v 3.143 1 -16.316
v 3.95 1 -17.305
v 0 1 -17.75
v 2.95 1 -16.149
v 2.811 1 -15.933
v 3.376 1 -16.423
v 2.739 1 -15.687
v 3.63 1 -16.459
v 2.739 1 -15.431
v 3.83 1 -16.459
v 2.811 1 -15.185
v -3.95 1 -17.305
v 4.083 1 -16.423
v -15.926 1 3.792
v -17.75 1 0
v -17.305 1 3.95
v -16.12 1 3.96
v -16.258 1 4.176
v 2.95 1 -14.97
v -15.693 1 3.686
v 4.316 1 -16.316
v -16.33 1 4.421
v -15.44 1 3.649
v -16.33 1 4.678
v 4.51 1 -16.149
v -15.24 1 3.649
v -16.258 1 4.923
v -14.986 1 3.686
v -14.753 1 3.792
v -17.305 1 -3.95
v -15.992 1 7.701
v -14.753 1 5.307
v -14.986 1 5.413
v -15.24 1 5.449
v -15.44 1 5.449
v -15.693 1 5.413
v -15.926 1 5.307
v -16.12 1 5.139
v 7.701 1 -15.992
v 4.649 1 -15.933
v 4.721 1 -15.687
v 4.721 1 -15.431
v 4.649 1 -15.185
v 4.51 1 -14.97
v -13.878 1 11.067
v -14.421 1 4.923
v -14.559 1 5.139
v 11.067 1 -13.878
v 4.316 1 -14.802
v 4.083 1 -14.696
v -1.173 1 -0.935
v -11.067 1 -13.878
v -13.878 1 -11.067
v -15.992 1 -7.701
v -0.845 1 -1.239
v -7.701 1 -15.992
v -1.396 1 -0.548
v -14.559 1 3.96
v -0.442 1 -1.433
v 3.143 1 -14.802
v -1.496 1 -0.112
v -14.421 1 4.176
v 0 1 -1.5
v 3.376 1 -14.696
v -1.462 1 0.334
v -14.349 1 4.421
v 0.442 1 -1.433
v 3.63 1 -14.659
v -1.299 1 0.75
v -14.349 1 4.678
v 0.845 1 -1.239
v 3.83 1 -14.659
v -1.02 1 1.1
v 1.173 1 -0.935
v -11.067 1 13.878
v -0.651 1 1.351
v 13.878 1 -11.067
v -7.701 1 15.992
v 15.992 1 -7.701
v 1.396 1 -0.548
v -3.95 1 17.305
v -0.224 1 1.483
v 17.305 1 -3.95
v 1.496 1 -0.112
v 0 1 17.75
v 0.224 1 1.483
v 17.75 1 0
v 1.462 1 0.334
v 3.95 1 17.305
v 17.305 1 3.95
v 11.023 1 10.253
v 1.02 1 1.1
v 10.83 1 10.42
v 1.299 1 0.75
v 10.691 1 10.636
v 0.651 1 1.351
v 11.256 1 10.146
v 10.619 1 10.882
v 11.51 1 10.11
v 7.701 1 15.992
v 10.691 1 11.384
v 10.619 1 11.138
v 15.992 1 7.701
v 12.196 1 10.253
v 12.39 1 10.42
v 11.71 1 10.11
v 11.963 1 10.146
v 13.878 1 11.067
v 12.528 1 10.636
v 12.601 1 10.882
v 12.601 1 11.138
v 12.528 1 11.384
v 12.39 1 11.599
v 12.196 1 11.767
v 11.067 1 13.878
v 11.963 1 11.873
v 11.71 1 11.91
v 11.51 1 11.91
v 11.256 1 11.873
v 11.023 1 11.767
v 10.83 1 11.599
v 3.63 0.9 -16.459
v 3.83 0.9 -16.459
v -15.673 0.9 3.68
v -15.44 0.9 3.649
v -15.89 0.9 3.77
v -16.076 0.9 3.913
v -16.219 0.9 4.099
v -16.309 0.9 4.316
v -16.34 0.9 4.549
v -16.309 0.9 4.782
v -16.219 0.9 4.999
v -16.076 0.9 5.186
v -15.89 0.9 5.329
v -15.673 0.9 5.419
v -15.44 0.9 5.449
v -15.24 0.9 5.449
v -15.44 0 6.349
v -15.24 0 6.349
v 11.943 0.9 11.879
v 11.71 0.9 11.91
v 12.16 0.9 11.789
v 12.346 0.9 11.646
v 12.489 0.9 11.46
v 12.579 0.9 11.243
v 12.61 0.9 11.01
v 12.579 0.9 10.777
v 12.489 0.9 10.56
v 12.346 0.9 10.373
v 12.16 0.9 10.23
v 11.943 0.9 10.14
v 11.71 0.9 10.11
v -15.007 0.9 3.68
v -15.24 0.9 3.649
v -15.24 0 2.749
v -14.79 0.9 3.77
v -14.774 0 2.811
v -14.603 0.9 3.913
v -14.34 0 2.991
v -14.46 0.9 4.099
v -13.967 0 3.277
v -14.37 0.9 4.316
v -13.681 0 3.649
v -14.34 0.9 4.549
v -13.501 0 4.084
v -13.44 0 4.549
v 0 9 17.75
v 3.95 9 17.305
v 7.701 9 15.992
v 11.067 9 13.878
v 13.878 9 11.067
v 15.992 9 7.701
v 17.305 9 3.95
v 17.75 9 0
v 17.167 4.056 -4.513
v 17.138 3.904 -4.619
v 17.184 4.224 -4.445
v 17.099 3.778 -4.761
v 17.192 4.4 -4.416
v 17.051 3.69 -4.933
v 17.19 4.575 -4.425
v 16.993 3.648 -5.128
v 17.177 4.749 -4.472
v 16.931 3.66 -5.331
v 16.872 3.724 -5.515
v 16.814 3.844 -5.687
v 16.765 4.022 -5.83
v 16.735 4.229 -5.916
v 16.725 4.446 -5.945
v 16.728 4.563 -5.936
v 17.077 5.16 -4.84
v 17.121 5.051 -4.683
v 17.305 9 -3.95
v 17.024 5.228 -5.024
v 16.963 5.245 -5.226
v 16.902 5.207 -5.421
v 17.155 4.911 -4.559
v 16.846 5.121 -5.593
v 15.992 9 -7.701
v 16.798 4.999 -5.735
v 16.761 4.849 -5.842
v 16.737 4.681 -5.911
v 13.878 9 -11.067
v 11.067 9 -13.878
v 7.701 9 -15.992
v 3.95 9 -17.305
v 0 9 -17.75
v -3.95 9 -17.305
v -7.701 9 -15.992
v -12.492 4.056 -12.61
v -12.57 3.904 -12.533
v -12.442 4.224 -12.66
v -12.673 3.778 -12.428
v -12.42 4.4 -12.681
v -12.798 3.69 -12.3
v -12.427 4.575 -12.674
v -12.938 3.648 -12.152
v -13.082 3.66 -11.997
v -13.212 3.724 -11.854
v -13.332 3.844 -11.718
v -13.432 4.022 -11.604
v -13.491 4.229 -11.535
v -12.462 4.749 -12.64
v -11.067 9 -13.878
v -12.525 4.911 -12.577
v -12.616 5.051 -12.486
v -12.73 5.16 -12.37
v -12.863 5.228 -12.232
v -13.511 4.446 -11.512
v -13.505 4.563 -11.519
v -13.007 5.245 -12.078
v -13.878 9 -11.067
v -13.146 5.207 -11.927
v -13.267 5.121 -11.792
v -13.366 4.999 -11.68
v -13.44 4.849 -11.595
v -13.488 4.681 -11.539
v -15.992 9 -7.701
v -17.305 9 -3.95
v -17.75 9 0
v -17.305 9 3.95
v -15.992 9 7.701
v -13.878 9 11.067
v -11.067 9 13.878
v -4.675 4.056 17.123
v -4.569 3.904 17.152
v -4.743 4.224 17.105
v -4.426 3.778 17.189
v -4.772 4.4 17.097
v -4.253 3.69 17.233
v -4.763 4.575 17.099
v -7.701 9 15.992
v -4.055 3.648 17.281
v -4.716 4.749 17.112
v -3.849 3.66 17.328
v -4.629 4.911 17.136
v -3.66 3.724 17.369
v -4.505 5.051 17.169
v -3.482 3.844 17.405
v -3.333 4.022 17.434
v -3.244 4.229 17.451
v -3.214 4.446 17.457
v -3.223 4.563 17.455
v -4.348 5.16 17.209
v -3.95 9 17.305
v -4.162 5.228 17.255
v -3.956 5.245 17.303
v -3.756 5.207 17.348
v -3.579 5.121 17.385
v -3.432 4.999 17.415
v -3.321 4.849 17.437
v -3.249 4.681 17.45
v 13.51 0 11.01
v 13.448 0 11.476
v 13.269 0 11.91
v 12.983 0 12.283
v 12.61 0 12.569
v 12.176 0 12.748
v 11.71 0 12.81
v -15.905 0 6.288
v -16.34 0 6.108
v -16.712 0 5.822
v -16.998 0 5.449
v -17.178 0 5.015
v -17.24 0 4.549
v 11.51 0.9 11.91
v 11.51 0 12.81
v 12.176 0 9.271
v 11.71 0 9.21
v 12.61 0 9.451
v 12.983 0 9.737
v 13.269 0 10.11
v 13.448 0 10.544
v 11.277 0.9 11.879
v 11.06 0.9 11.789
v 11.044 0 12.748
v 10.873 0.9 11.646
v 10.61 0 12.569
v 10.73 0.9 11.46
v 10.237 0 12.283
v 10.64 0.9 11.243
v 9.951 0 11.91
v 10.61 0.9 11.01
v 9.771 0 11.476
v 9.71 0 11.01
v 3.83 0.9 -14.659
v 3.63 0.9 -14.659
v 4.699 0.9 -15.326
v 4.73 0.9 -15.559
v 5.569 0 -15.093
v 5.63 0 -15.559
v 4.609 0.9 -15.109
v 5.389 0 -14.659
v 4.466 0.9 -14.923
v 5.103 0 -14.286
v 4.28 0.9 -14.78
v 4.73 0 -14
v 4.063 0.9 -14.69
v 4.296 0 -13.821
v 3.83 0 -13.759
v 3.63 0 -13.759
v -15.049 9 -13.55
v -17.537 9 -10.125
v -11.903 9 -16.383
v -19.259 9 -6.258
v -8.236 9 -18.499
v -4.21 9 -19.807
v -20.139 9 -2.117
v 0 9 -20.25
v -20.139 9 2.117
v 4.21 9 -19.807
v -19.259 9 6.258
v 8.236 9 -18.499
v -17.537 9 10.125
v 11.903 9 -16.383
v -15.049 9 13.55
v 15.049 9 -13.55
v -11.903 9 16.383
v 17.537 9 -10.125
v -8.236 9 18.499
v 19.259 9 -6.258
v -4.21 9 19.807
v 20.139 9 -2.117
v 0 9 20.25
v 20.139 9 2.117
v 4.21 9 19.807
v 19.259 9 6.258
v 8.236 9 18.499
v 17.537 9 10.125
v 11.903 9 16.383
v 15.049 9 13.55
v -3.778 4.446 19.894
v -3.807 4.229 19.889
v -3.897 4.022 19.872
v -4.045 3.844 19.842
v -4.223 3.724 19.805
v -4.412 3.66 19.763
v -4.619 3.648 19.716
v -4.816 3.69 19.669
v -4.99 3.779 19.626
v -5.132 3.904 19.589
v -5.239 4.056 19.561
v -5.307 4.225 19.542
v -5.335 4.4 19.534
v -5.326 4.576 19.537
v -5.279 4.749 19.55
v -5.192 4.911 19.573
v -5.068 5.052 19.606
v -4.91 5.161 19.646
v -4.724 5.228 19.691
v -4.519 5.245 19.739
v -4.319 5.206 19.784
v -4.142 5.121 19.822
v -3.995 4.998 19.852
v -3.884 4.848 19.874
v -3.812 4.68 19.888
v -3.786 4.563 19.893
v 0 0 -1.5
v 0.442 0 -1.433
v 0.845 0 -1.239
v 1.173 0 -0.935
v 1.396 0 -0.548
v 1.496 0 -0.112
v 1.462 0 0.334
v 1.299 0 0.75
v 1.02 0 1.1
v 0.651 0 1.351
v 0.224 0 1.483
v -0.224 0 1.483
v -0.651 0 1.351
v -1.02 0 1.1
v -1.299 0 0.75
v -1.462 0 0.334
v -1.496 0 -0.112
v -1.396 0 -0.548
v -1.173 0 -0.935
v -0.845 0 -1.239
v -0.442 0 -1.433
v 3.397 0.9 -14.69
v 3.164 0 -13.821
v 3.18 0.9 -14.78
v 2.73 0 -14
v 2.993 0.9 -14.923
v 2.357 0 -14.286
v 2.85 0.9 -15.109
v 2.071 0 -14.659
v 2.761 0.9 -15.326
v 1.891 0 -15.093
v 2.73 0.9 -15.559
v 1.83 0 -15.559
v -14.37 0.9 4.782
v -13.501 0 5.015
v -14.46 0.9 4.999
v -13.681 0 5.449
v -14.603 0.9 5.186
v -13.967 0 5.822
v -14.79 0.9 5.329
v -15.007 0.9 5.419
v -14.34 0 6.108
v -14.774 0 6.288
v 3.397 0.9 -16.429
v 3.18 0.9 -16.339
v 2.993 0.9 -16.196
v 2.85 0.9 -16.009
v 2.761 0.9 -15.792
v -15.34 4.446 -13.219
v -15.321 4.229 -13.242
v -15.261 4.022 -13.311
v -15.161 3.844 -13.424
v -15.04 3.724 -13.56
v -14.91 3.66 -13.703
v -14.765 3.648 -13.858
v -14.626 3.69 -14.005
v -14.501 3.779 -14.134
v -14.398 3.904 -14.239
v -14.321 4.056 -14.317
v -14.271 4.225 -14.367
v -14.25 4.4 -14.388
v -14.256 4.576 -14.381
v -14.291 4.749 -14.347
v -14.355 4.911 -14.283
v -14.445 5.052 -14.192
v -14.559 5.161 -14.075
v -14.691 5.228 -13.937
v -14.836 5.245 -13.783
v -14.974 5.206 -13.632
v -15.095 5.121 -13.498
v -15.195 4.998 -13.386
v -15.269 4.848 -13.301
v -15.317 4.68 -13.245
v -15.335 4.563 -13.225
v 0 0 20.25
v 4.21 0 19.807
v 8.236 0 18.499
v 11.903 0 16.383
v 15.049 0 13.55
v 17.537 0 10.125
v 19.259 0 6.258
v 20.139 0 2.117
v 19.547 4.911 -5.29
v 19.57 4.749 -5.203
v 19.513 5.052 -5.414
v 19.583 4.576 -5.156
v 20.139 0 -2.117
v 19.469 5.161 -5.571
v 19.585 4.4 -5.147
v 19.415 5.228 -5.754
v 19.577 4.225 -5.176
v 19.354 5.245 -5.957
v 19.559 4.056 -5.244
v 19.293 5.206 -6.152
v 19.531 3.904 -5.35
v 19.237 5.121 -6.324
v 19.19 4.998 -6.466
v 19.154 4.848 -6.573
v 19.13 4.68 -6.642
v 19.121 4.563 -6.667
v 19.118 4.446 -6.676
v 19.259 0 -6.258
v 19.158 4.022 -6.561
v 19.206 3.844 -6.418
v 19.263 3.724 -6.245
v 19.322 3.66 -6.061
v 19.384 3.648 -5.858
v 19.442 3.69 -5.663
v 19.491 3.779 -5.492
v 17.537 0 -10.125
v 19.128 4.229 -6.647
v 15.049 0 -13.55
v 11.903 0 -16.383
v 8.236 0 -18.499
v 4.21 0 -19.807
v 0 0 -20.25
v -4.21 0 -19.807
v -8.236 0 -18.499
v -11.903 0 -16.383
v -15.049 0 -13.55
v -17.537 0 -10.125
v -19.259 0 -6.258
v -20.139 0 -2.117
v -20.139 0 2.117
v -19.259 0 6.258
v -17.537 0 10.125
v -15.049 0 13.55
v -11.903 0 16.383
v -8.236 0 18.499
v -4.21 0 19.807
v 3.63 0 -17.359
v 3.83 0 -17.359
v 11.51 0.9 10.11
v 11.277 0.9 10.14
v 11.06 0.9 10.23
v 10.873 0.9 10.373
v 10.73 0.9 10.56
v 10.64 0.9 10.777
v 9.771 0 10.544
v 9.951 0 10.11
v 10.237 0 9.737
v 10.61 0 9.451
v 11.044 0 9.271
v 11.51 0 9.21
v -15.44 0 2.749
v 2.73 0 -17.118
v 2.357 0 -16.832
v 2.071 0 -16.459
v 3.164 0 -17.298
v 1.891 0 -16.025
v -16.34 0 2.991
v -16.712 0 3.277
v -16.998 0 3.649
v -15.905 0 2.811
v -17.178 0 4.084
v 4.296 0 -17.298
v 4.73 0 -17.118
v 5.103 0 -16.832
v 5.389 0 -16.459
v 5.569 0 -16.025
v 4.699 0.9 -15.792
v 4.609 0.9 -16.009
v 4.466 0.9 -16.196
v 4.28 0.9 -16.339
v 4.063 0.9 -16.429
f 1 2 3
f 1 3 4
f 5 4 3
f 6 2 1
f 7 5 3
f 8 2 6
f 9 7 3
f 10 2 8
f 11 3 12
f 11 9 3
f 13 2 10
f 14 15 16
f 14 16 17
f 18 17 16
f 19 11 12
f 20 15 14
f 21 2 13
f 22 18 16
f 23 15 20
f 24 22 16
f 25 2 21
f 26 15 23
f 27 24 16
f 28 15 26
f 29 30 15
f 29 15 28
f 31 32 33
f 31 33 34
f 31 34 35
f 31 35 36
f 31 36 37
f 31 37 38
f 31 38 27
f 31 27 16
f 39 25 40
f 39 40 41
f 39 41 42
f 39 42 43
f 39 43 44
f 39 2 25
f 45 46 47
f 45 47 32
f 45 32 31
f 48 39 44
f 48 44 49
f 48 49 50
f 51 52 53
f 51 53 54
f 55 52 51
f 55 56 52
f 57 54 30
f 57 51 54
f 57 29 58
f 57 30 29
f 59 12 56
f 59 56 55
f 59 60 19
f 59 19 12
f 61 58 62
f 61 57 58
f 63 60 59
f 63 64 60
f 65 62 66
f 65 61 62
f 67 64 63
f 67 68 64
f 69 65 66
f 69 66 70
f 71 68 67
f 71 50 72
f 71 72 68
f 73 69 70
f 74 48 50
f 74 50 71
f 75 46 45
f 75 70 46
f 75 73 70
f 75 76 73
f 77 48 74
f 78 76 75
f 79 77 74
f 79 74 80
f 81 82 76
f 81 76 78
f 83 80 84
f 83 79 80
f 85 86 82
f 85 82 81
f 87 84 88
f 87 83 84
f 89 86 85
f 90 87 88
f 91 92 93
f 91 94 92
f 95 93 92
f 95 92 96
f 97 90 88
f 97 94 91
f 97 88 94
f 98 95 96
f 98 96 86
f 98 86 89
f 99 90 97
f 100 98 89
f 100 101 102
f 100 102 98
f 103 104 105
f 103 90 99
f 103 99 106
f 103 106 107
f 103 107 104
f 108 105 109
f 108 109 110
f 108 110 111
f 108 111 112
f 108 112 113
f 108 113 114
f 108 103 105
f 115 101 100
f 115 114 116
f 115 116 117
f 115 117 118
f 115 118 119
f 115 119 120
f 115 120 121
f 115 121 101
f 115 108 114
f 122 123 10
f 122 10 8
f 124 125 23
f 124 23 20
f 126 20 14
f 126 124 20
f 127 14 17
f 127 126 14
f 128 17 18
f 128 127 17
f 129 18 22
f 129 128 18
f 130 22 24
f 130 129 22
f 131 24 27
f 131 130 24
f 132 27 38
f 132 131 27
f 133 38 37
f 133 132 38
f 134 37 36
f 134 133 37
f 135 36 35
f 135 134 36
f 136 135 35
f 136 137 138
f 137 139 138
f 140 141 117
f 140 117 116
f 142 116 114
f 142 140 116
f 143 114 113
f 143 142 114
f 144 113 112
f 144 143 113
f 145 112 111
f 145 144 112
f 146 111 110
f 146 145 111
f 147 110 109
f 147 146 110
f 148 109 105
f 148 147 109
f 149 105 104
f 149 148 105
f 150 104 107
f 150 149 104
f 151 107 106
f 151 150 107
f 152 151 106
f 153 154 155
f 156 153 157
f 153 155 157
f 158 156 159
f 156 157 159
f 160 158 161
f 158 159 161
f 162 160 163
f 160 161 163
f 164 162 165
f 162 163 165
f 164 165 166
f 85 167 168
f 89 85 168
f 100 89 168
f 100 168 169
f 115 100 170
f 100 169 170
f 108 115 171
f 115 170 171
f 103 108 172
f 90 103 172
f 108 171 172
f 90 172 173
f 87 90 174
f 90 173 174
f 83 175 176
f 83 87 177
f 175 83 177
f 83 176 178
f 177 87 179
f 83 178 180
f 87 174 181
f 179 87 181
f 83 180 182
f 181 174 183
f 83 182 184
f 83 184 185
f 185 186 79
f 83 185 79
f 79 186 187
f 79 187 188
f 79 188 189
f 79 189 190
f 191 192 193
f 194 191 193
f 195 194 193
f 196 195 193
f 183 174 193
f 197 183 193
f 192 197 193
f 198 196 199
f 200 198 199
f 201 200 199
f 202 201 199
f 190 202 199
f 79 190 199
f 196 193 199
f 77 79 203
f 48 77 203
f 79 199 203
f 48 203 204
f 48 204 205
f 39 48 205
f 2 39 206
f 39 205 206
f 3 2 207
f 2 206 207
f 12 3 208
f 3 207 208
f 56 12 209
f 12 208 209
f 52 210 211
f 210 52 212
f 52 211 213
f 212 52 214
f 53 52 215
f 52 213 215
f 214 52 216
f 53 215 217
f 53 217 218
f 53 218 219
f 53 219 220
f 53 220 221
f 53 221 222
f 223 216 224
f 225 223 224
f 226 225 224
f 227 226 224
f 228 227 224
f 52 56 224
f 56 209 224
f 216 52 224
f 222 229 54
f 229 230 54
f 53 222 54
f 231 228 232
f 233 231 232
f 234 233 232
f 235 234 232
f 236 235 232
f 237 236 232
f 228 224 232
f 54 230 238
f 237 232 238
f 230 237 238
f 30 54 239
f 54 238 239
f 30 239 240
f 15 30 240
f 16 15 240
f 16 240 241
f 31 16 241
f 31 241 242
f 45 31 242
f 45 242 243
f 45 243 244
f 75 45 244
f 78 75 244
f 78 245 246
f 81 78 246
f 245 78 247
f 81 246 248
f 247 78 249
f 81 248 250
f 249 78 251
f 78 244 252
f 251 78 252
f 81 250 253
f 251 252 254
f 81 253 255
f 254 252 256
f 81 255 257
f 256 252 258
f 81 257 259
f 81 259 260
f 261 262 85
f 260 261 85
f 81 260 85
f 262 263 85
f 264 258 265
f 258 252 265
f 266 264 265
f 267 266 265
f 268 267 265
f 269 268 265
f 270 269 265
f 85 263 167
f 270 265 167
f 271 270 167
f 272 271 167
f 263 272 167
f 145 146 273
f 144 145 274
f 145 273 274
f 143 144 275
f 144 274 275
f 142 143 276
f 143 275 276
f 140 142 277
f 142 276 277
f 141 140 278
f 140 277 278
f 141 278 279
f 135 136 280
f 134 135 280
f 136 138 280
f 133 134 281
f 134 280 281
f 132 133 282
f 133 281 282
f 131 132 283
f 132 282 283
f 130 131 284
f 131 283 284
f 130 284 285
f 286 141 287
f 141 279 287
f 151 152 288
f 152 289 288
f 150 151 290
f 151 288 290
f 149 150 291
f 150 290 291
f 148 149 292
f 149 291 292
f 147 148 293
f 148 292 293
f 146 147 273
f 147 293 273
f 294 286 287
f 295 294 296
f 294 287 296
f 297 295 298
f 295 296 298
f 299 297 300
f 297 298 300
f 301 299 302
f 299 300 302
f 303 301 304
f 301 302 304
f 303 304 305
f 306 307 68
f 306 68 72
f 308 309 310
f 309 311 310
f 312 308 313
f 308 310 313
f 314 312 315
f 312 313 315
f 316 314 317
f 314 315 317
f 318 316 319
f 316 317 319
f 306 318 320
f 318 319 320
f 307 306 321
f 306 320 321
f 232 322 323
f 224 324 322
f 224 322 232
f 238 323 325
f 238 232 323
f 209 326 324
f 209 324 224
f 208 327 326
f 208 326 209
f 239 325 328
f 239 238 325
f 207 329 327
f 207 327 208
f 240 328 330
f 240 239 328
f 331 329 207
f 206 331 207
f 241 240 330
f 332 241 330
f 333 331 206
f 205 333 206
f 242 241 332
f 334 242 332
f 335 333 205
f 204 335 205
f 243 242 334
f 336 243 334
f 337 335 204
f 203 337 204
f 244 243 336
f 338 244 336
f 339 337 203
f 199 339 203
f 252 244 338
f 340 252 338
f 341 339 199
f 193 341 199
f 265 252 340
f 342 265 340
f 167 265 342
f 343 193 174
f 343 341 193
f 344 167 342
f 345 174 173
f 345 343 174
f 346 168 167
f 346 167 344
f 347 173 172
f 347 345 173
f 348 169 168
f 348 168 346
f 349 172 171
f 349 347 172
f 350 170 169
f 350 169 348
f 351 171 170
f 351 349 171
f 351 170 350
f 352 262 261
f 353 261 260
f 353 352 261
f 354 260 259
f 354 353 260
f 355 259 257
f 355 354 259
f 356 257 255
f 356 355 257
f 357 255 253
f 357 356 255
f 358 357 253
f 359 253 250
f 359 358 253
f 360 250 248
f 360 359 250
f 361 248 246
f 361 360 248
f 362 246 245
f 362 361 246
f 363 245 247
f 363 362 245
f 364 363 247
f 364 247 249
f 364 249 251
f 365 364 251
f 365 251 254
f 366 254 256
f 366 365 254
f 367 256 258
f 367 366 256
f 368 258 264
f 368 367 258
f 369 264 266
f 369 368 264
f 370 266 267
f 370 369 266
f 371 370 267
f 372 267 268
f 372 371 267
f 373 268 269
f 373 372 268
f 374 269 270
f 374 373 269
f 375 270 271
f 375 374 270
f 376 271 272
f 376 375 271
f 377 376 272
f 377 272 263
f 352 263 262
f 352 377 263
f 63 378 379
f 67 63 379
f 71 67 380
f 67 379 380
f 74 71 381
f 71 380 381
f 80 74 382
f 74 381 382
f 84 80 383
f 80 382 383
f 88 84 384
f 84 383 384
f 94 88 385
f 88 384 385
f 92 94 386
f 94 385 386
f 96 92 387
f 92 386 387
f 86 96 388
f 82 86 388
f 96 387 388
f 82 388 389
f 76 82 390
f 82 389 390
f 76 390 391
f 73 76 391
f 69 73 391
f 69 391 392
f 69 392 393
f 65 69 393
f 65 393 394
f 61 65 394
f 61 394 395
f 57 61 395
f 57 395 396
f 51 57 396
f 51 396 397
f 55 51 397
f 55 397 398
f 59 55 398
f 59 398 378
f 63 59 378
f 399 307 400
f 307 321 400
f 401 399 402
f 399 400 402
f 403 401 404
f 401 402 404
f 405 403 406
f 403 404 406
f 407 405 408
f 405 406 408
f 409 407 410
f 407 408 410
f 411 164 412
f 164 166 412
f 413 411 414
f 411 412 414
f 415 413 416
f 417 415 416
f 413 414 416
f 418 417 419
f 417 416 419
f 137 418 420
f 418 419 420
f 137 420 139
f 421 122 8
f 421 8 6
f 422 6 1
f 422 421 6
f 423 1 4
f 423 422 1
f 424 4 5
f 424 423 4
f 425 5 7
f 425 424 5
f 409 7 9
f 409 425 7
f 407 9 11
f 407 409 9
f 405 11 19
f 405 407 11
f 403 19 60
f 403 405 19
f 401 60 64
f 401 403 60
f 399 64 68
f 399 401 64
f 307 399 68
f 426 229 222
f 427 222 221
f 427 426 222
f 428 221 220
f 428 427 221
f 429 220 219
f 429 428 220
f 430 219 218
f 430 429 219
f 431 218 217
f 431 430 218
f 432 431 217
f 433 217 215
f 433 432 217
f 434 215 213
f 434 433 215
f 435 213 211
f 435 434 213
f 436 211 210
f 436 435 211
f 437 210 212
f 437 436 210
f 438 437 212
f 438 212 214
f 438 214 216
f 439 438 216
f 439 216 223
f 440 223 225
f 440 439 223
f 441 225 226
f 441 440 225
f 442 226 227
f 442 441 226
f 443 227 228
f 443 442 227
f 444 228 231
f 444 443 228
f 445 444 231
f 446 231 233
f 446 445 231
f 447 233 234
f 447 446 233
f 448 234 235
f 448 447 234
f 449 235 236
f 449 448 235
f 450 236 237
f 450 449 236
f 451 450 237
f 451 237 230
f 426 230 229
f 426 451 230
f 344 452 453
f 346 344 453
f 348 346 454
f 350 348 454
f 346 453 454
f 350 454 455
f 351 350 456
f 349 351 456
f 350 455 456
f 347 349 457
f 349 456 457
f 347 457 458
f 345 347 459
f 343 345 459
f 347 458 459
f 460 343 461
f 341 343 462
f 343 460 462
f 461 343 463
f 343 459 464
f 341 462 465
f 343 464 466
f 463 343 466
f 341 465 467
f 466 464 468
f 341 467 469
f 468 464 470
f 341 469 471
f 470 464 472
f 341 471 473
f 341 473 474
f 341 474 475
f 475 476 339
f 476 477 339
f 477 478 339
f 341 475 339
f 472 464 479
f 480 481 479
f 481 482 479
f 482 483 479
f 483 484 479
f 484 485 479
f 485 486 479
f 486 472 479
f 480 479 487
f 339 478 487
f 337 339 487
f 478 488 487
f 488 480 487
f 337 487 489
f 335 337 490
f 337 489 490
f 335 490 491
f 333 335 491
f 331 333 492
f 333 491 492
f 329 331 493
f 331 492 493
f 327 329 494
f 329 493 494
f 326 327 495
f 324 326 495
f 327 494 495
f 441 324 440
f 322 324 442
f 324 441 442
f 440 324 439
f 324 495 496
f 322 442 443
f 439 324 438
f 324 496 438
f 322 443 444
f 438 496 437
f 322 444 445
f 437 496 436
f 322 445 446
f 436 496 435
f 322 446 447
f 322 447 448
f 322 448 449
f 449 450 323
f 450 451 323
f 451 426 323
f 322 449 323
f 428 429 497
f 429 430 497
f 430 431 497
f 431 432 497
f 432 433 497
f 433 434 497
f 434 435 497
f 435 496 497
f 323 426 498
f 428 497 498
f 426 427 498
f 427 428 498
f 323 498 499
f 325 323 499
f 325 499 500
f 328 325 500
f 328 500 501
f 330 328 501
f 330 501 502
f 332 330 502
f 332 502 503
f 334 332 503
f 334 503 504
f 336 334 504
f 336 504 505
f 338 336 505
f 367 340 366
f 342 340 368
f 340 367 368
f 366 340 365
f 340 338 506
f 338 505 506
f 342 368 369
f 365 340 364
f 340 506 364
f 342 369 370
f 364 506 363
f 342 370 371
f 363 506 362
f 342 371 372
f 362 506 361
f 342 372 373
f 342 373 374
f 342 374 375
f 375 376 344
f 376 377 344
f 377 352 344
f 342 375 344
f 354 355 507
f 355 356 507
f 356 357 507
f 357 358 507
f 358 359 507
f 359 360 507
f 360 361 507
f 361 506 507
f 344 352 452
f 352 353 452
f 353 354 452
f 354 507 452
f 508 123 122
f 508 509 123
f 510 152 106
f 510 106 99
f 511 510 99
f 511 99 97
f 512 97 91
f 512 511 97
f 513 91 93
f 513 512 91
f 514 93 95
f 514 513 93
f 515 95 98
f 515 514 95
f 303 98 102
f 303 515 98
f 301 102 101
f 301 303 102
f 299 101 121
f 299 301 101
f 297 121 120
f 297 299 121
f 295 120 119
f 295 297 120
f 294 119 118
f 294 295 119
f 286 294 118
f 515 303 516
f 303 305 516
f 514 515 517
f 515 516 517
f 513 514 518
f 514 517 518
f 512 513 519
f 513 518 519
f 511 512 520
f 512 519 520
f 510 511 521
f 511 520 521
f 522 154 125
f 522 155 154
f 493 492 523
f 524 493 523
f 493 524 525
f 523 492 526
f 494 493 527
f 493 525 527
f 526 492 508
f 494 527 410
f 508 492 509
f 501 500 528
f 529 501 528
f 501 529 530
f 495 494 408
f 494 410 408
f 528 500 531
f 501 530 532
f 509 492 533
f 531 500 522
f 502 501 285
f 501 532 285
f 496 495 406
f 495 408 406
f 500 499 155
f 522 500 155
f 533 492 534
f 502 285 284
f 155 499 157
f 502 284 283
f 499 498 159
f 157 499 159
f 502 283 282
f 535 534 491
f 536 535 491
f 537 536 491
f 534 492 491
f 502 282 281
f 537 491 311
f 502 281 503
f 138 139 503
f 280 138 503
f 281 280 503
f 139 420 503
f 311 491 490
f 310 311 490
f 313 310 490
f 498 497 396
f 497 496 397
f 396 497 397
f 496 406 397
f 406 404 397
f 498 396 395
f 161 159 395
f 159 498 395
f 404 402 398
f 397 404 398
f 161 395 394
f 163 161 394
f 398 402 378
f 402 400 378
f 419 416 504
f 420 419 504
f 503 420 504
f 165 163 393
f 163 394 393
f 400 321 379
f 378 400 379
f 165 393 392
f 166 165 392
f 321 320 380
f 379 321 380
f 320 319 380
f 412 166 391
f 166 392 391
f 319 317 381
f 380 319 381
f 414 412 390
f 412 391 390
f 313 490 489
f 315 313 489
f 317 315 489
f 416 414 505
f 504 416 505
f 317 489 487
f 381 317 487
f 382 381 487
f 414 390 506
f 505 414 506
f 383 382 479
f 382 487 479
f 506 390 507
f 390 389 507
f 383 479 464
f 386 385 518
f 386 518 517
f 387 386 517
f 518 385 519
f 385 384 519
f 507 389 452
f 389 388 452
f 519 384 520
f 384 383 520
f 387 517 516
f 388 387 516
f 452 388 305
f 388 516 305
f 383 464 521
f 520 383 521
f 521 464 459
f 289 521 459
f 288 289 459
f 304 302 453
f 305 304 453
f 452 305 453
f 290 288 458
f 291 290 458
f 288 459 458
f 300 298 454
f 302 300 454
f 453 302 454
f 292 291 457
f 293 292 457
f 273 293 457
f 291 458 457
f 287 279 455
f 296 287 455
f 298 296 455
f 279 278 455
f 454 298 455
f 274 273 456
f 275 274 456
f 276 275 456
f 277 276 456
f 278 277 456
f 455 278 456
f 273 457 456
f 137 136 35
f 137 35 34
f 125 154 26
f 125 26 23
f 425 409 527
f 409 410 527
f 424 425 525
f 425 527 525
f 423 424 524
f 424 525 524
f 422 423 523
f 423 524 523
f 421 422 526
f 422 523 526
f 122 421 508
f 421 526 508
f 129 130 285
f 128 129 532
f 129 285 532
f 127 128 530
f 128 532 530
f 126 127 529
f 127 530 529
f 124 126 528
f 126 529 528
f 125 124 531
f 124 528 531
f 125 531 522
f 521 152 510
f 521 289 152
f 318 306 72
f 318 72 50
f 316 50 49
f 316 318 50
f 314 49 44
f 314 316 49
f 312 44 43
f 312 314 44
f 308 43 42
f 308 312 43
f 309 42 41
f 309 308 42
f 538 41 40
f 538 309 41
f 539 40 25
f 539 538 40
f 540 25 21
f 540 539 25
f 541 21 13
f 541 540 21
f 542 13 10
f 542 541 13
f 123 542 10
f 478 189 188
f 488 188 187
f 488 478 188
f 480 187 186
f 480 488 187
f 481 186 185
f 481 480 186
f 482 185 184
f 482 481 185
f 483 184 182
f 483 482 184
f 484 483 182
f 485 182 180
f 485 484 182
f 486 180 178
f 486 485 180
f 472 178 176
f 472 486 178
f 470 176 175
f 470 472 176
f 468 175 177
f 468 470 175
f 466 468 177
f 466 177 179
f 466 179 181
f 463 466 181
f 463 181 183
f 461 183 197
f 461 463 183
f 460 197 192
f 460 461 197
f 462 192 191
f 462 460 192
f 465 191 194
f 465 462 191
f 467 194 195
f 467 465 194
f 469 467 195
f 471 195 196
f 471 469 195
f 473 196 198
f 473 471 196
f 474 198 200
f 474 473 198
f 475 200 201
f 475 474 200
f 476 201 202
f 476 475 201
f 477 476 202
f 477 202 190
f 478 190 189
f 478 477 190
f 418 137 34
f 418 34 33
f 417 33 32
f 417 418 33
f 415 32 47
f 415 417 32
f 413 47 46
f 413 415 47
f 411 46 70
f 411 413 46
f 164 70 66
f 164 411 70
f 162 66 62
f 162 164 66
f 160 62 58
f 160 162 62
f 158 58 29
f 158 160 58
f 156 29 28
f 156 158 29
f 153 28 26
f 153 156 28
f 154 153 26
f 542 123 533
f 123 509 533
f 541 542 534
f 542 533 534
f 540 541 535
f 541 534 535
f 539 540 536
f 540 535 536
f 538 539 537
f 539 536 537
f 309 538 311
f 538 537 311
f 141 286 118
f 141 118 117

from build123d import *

# Parameters (mm, degrees)
SKETCH1_R                                     = 20.25
BOSS_EXTRUDE1_DEPTH                           = 9
SKETCH2_R                                     = 17.75
CUT_EXTRUDE1_DEPTH                            = 8
CSK_START                                     = -1
CSK_SLOT_FOR_M1_6_COUNTERSUNK_FLAT_HEAD_DEPTH = 3
CIRPATTERN1_START                             = -1
CIRPATTERN1_DEPTH                             = 3
SKETCH5_R                                     = 1.5
CUT_EXTRUDE2_DEPTH                            = 8
CIRPATTERN2_COUNT                             = 3


with BuildPart() as part:
    # Sketch1 → Boss-Extrude1 (new body)
    with BuildSketch(Plane(origin=(0, 0, 0), x_dir=(1, 0, 0), z_dir=(0, 1, 0))):
        with Locations(Location((0, 0, 0), (0, 0, 270))):
            Circle(SKETCH1_R)
    extrude(amount=BOSS_EXTRUDE1_DEPTH)

    # Sketch2 → Cut-Extrude1 (cut)
    with BuildSketch(Plane(origin=(0, 9, 0), x_dir=(1, 0, 0), z_dir=(0, 1, 0))):
        with Locations(Location((0, 0, 0), (0, 0, 270))):
            Circle(SKETCH2_R)
    extrude(amount=-CUT_EXTRUDE1_DEPTH, mode=Mode.SUBTRACT)

    # CSK SLOT for M1.6 Countersunk Flat Head: read off the stored shape, not the designer's step
    # CSK SLOT for M1.6 Countersunk Flat H 2 → CSK SLOT for M1.6 Countersunk Flat Head (cut)
    with BuildSketch(Plane(origin=(0, 0, 0), x_dir=(1, 0, 0), z_dir=(0, 1, 0)).offset(CSK_START)):
        with BuildLine():
            ThreePointArc((11.709715894, -11.90974554), (12.609715894, -11.00974554), (11.709715894, -10.10974554))
            Line((11.709715894, -10.10974554), (11.509715894, -10.10974554))
            ThreePointArc((11.509715894, -10.10974554), (10.609715894, -11.00974554), (11.509715894, -11.90974554))
            Line((11.509715894, -11.90974554), (11.709715894, -11.90974554))
        make_face()
    extrude(amount=CSK_SLOT_FOR_M1_6_COUNTERSUNK_FLAT_HEAD_DEPTH, mode=Mode.SUBTRACT)

    # CSK SLOT for M1.6 Countersunk Flat H 3: loft between two sections, ruled curve by curve
    csk_slot_for_m1_6_countersunk_flat_h_3_from = [
        Edge.make_three_point_arc((11.709715894, 0.9, 10.10974554), (12.346111997, 0.9, 10.373349437), (12.609715894, 0.9, 11.00974554)),
        Edge.make_three_point_arc((12.609715894, 0.9, 11.00974554), (12.346111997, 0.9, 11.646141643), (11.709715894, 0.9, 11.90974554)),
        Edge.make_three_point_arc((11.509715894, 0.9, 11.90974554), (10.873319791, 0.9, 11.646141643), (10.609715894, 0.9, 11.00974554)),
        Edge.make_three_point_arc((10.609715894, 0.9, 11.00974554), (10.873319791, 0.9, 10.373349437), (11.509715894, 0.9, 10.10974554)),
        Edge.make_line((11.709715894, 0.9, 11.90974554), (11.509715894, 0.9, 11.90974554)),
        Edge.make_line((11.709715894, 0.9, 10.10974554), (11.509715894, 0.9, 10.10974554)),
    ]
    csk_slot_for_m1_6_countersunk_flat_h_3_to = [
        Edge.make_three_point_arc((11.709715894, 0, 9.20974554), (12.9825081, 0, 9.736953334), (13.509715894, 0, 11.00974554)),
        Edge.make_three_point_arc((13.509715894, 0, 11.00974554), (12.9825081, 0, 12.282537747), (11.709715894, 0, 12.80974554)),
        Edge.make_three_point_arc((11.509715894, 0, 12.80974554), (10.236923688, 0, 12.282537747), (9.709715894, 0, 11.00974554)),
        Edge.make_three_point_arc((9.709715894, 0, 11.00974554), (10.236923688, 0, 9.736953334), (11.509715894, 0, 9.20974554)),
        Edge.make_line((11.709715894, 0, 12.80974554), (11.509715894, 0, 12.80974554)),
        Edge.make_line((11.709715894, 0, 9.20974554), (11.509715894, 0, 9.20974554)),
    ]
    csk_slot_for_m1_6_countersunk_flat_h_3 = Solid(Shell([*[Face.make_surface_from_curves(csk_slot_for_m1_6_countersunk_flat_h_3_from[k], csk_slot_for_m1_6_countersunk_flat_h_3_to[k]) for k in range(6)], Face(Wire(csk_slot_for_m1_6_countersunk_flat_h_3_from)), Face(Wire(csk_slot_for_m1_6_countersunk_flat_h_3_to))]))
    add(csk_slot_for_m1_6_countersunk_flat_h_3, mode=Mode.SUBTRACT)

    # CirPattern1: read off the stored shape, not the designer's step
    # CirPattern1 outline → CirPattern1 (cut)
    with BuildSketch(Plane(origin=(0, 0, 0), x_dir=(1, 0, 0), z_dir=(0, 1, 0)).offset(CIRPATTERN1_START)):
        with BuildLine():
            ThreePointArc((-15.239577274, -5.449436125), (-14.339577274, -4.549436125), (-15.239577274, -3.649436125))
            Line((-15.239577274, -3.649436125), (-15.439577274, -3.649436125))
            ThreePointArc((-15.439577274, -3.649436125), (-16.339577274, -4.549436125), (-15.439577274, -5.449436125))
            Line((-15.439577274, -5.449436125), (-15.239577274, -5.449436125))
        make_face()
        with BuildLine():
            ThreePointArc((3.82986138, 14.659181665), (4.72986138, 15.559181665), (3.82986138, 16.459181665))
            Line((3.82986138, 16.459181665), (3.62986138, 16.459181665))
            ThreePointArc((3.62986138, 16.459181665), (2.72986138, 15.559181665), (3.62986138, 14.659181665))
            Line((3.62986138, 14.659181665), (3.82986138, 14.659181665))
        make_face()
    extrude(amount=CIRPATTERN1_DEPTH, mode=Mode.SUBTRACT)

    # CirPattern1 2: loft between two sections, ruled curve by curve
    cirpattern1_2_from = [
        Edge.make_three_point_arc((-15.239577274, 0.9, 3.649436125), (-14.603181171, 0.9, 3.913040022), (-14.339577274, 0.9, 4.549436125)),
        Edge.make_three_point_arc((-14.339577274, 0.9, 4.549436125), (-14.603181171, 0.9, 5.185832228), (-15.239577274, 0.9, 5.449436125)),
        Edge.make_three_point_arc((-15.439577274, 0.9, 5.449436125), (-16.075973377, 0.9, 5.185832228), (-16.339577274, 0.9, 4.549436125)),
        Edge.make_three_point_arc((-16.339577274, 0.9, 4.549436125), (-16.075973377, 0.9, 3.913040022), (-15.439577274, 0.9, 3.649436125)),
        Edge.make_line((-15.239577274, 0.9, 5.449436125), (-15.439577274, 0.9, 5.449436125)),
        Edge.make_line((-15.239577274, 0.9, 3.649436125), (-15.439577274, 0.9, 3.649436125)),
    ]
    cirpattern1_2_to = [
        Edge.make_three_point_arc((-15.239577274, 0, 2.749436125), (-13.966785068, 0, 3.276643918), (-13.439577274, 0, 4.549436125)),
        Edge.make_three_point_arc((-13.439577274, 0, 4.549436125), (-13.966785068, 0, 5.822228331), (-15.239577274, 0, 6.349436125)),
        Edge.make_three_point_arc((-15.439577274, 0, 6.349436125), (-16.71236948, 0, 5.822228331), (-17.239577274, 0, 4.549436125)),
        Edge.make_three_point_arc((-17.239577274, 0, 4.549436125), (-16.71236948, 0, 3.276643918), (-15.439577274, 0, 2.749436125)),
        Edge.make_line((-15.239577274, 0, 6.349436125), (-15.439577274, 0, 6.349436125)),
        Edge.make_line((-15.239577274, 0, 2.749436125), (-15.439577274, 0, 2.749436125)),
    ]
    cirpattern1_2 = Solid(Shell([*[Face.make_surface_from_curves(cirpattern1_2_from[k], cirpattern1_2_to[k]) for k in range(6)], Face(Wire(cirpattern1_2_from)), Face(Wire(cirpattern1_2_to))]))
    add(cirpattern1_2, mode=Mode.SUBTRACT)

    # CirPattern1 3: loft between two sections, ruled curve by curve
    cirpattern1_3_from = [
        Edge.make_three_point_arc((3.82986138, 0.9, -16.459181665), (4.466257483, 0.9, -16.195577768), (4.72986138, 0.9, -15.559181665)),
        Edge.make_three_point_arc((4.72986138, 0.9, -15.559181665), (4.466257483, 0.9, -14.922785562), (3.82986138, 0.9, -14.659181665)),
        Edge.make_three_point_arc((3.62986138, 0.9, -14.659181665), (2.993465277, 0.9, -14.922785562), (2.72986138, 0.9, -15.559181665)),
        Edge.make_three_point_arc((2.72986138, 0.9, -15.559181665), (2.993465277, 0.9, -16.195577768), (3.62986138, 0.9, -16.459181665)),
        Edge.make_line((3.82986138, 0.9, -14.659181665), (3.62986138, 0.9, -14.659181665)),
        Edge.make_line((3.82986138, 0.9, -16.459181665), (3.62986138, 0.9, -16.459181665)),
    ]
    cirpattern1_3_to = [
        Edge.make_three_point_arc((3.82986138, 0, -17.359181665), (5.102653586, 0, -16.831973871), (5.62986138, 0, -15.559181665)),
        Edge.make_three_point_arc((5.62986138, 0, -15.559181665), (5.102653586, 0, -14.286389459), (3.82986138, 0, -13.759181665)),
        Edge.make_three_point_arc((3.62986138, 0, -13.759181665), (2.357069174, 0, -14.286389459), (1.82986138, 0, -15.559181665)),
        Edge.make_three_point_arc((1.82986138, 0, -15.559181665), (2.357069174, 0, -16.831973871), (3.62986138, 0, -17.359181665)),
        Edge.make_line((3.82986138, 0, -13.759181665), (3.62986138, 0, -13.759181665)),
        Edge.make_line((3.82986138, 0, -17.359181665), (3.62986138, 0, -17.359181665)),
    ]
    cirpattern1_3 = Solid(Shell([*[Face.make_surface_from_curves(cirpattern1_3_from[k], cirpattern1_3_to[k]) for k in range(6)], Face(Wire(cirpattern1_3_from)), Face(Wire(cirpattern1_3_to))]))
    add(cirpattern1_3, mode=Mode.SUBTRACT)

    # Sketch5 → Cut-Extrude2 (cut)
    with BuildSketch(Plane.XZ):
        with Locations(Location((0, 0, 0), (0, 0, 270))):
            Circle(SKETCH5_R)
    extrude(amount=-CUT_EXTRUDE2_DEPTH, mode=Mode.SUBTRACT)

    # Sketch6 → M2 Tapped Hole1 (revolve, cut)
    with BuildSketch(Plane(origin=(-4.560794248, 4.445790719, 19.729715047), x_dir=(0.974306915892993, 0, 0.22522440729877435), z_dir=(0, 1, 0))):
        Polygon((0, 0), (0, 4.980688495), (0.8, 4.5), (0.8, 0), align=None)
    m2_tapped_hole1 = revolve(axis=Axis((-5.990969234, 4.445790719, 25.916563963), (0.22522440729877433, 0, -0.9743069158929931)), mode=Mode.SUBTRACT)

    # CirPattern2: M2 Tapped Hole1 ×3 about axis
    cirpattern2_axis = Axis((0, 9, 0), (0, -1, 0))
    for i in range(1, CIRPATTERN2_COUNT):
        add(m2_tapped_hole1.rotate(cirpattern2_axis, i * 360 / CIRPATTERN2_COUNT), mode=Mode.SUBTRACT)


solid = part.part
